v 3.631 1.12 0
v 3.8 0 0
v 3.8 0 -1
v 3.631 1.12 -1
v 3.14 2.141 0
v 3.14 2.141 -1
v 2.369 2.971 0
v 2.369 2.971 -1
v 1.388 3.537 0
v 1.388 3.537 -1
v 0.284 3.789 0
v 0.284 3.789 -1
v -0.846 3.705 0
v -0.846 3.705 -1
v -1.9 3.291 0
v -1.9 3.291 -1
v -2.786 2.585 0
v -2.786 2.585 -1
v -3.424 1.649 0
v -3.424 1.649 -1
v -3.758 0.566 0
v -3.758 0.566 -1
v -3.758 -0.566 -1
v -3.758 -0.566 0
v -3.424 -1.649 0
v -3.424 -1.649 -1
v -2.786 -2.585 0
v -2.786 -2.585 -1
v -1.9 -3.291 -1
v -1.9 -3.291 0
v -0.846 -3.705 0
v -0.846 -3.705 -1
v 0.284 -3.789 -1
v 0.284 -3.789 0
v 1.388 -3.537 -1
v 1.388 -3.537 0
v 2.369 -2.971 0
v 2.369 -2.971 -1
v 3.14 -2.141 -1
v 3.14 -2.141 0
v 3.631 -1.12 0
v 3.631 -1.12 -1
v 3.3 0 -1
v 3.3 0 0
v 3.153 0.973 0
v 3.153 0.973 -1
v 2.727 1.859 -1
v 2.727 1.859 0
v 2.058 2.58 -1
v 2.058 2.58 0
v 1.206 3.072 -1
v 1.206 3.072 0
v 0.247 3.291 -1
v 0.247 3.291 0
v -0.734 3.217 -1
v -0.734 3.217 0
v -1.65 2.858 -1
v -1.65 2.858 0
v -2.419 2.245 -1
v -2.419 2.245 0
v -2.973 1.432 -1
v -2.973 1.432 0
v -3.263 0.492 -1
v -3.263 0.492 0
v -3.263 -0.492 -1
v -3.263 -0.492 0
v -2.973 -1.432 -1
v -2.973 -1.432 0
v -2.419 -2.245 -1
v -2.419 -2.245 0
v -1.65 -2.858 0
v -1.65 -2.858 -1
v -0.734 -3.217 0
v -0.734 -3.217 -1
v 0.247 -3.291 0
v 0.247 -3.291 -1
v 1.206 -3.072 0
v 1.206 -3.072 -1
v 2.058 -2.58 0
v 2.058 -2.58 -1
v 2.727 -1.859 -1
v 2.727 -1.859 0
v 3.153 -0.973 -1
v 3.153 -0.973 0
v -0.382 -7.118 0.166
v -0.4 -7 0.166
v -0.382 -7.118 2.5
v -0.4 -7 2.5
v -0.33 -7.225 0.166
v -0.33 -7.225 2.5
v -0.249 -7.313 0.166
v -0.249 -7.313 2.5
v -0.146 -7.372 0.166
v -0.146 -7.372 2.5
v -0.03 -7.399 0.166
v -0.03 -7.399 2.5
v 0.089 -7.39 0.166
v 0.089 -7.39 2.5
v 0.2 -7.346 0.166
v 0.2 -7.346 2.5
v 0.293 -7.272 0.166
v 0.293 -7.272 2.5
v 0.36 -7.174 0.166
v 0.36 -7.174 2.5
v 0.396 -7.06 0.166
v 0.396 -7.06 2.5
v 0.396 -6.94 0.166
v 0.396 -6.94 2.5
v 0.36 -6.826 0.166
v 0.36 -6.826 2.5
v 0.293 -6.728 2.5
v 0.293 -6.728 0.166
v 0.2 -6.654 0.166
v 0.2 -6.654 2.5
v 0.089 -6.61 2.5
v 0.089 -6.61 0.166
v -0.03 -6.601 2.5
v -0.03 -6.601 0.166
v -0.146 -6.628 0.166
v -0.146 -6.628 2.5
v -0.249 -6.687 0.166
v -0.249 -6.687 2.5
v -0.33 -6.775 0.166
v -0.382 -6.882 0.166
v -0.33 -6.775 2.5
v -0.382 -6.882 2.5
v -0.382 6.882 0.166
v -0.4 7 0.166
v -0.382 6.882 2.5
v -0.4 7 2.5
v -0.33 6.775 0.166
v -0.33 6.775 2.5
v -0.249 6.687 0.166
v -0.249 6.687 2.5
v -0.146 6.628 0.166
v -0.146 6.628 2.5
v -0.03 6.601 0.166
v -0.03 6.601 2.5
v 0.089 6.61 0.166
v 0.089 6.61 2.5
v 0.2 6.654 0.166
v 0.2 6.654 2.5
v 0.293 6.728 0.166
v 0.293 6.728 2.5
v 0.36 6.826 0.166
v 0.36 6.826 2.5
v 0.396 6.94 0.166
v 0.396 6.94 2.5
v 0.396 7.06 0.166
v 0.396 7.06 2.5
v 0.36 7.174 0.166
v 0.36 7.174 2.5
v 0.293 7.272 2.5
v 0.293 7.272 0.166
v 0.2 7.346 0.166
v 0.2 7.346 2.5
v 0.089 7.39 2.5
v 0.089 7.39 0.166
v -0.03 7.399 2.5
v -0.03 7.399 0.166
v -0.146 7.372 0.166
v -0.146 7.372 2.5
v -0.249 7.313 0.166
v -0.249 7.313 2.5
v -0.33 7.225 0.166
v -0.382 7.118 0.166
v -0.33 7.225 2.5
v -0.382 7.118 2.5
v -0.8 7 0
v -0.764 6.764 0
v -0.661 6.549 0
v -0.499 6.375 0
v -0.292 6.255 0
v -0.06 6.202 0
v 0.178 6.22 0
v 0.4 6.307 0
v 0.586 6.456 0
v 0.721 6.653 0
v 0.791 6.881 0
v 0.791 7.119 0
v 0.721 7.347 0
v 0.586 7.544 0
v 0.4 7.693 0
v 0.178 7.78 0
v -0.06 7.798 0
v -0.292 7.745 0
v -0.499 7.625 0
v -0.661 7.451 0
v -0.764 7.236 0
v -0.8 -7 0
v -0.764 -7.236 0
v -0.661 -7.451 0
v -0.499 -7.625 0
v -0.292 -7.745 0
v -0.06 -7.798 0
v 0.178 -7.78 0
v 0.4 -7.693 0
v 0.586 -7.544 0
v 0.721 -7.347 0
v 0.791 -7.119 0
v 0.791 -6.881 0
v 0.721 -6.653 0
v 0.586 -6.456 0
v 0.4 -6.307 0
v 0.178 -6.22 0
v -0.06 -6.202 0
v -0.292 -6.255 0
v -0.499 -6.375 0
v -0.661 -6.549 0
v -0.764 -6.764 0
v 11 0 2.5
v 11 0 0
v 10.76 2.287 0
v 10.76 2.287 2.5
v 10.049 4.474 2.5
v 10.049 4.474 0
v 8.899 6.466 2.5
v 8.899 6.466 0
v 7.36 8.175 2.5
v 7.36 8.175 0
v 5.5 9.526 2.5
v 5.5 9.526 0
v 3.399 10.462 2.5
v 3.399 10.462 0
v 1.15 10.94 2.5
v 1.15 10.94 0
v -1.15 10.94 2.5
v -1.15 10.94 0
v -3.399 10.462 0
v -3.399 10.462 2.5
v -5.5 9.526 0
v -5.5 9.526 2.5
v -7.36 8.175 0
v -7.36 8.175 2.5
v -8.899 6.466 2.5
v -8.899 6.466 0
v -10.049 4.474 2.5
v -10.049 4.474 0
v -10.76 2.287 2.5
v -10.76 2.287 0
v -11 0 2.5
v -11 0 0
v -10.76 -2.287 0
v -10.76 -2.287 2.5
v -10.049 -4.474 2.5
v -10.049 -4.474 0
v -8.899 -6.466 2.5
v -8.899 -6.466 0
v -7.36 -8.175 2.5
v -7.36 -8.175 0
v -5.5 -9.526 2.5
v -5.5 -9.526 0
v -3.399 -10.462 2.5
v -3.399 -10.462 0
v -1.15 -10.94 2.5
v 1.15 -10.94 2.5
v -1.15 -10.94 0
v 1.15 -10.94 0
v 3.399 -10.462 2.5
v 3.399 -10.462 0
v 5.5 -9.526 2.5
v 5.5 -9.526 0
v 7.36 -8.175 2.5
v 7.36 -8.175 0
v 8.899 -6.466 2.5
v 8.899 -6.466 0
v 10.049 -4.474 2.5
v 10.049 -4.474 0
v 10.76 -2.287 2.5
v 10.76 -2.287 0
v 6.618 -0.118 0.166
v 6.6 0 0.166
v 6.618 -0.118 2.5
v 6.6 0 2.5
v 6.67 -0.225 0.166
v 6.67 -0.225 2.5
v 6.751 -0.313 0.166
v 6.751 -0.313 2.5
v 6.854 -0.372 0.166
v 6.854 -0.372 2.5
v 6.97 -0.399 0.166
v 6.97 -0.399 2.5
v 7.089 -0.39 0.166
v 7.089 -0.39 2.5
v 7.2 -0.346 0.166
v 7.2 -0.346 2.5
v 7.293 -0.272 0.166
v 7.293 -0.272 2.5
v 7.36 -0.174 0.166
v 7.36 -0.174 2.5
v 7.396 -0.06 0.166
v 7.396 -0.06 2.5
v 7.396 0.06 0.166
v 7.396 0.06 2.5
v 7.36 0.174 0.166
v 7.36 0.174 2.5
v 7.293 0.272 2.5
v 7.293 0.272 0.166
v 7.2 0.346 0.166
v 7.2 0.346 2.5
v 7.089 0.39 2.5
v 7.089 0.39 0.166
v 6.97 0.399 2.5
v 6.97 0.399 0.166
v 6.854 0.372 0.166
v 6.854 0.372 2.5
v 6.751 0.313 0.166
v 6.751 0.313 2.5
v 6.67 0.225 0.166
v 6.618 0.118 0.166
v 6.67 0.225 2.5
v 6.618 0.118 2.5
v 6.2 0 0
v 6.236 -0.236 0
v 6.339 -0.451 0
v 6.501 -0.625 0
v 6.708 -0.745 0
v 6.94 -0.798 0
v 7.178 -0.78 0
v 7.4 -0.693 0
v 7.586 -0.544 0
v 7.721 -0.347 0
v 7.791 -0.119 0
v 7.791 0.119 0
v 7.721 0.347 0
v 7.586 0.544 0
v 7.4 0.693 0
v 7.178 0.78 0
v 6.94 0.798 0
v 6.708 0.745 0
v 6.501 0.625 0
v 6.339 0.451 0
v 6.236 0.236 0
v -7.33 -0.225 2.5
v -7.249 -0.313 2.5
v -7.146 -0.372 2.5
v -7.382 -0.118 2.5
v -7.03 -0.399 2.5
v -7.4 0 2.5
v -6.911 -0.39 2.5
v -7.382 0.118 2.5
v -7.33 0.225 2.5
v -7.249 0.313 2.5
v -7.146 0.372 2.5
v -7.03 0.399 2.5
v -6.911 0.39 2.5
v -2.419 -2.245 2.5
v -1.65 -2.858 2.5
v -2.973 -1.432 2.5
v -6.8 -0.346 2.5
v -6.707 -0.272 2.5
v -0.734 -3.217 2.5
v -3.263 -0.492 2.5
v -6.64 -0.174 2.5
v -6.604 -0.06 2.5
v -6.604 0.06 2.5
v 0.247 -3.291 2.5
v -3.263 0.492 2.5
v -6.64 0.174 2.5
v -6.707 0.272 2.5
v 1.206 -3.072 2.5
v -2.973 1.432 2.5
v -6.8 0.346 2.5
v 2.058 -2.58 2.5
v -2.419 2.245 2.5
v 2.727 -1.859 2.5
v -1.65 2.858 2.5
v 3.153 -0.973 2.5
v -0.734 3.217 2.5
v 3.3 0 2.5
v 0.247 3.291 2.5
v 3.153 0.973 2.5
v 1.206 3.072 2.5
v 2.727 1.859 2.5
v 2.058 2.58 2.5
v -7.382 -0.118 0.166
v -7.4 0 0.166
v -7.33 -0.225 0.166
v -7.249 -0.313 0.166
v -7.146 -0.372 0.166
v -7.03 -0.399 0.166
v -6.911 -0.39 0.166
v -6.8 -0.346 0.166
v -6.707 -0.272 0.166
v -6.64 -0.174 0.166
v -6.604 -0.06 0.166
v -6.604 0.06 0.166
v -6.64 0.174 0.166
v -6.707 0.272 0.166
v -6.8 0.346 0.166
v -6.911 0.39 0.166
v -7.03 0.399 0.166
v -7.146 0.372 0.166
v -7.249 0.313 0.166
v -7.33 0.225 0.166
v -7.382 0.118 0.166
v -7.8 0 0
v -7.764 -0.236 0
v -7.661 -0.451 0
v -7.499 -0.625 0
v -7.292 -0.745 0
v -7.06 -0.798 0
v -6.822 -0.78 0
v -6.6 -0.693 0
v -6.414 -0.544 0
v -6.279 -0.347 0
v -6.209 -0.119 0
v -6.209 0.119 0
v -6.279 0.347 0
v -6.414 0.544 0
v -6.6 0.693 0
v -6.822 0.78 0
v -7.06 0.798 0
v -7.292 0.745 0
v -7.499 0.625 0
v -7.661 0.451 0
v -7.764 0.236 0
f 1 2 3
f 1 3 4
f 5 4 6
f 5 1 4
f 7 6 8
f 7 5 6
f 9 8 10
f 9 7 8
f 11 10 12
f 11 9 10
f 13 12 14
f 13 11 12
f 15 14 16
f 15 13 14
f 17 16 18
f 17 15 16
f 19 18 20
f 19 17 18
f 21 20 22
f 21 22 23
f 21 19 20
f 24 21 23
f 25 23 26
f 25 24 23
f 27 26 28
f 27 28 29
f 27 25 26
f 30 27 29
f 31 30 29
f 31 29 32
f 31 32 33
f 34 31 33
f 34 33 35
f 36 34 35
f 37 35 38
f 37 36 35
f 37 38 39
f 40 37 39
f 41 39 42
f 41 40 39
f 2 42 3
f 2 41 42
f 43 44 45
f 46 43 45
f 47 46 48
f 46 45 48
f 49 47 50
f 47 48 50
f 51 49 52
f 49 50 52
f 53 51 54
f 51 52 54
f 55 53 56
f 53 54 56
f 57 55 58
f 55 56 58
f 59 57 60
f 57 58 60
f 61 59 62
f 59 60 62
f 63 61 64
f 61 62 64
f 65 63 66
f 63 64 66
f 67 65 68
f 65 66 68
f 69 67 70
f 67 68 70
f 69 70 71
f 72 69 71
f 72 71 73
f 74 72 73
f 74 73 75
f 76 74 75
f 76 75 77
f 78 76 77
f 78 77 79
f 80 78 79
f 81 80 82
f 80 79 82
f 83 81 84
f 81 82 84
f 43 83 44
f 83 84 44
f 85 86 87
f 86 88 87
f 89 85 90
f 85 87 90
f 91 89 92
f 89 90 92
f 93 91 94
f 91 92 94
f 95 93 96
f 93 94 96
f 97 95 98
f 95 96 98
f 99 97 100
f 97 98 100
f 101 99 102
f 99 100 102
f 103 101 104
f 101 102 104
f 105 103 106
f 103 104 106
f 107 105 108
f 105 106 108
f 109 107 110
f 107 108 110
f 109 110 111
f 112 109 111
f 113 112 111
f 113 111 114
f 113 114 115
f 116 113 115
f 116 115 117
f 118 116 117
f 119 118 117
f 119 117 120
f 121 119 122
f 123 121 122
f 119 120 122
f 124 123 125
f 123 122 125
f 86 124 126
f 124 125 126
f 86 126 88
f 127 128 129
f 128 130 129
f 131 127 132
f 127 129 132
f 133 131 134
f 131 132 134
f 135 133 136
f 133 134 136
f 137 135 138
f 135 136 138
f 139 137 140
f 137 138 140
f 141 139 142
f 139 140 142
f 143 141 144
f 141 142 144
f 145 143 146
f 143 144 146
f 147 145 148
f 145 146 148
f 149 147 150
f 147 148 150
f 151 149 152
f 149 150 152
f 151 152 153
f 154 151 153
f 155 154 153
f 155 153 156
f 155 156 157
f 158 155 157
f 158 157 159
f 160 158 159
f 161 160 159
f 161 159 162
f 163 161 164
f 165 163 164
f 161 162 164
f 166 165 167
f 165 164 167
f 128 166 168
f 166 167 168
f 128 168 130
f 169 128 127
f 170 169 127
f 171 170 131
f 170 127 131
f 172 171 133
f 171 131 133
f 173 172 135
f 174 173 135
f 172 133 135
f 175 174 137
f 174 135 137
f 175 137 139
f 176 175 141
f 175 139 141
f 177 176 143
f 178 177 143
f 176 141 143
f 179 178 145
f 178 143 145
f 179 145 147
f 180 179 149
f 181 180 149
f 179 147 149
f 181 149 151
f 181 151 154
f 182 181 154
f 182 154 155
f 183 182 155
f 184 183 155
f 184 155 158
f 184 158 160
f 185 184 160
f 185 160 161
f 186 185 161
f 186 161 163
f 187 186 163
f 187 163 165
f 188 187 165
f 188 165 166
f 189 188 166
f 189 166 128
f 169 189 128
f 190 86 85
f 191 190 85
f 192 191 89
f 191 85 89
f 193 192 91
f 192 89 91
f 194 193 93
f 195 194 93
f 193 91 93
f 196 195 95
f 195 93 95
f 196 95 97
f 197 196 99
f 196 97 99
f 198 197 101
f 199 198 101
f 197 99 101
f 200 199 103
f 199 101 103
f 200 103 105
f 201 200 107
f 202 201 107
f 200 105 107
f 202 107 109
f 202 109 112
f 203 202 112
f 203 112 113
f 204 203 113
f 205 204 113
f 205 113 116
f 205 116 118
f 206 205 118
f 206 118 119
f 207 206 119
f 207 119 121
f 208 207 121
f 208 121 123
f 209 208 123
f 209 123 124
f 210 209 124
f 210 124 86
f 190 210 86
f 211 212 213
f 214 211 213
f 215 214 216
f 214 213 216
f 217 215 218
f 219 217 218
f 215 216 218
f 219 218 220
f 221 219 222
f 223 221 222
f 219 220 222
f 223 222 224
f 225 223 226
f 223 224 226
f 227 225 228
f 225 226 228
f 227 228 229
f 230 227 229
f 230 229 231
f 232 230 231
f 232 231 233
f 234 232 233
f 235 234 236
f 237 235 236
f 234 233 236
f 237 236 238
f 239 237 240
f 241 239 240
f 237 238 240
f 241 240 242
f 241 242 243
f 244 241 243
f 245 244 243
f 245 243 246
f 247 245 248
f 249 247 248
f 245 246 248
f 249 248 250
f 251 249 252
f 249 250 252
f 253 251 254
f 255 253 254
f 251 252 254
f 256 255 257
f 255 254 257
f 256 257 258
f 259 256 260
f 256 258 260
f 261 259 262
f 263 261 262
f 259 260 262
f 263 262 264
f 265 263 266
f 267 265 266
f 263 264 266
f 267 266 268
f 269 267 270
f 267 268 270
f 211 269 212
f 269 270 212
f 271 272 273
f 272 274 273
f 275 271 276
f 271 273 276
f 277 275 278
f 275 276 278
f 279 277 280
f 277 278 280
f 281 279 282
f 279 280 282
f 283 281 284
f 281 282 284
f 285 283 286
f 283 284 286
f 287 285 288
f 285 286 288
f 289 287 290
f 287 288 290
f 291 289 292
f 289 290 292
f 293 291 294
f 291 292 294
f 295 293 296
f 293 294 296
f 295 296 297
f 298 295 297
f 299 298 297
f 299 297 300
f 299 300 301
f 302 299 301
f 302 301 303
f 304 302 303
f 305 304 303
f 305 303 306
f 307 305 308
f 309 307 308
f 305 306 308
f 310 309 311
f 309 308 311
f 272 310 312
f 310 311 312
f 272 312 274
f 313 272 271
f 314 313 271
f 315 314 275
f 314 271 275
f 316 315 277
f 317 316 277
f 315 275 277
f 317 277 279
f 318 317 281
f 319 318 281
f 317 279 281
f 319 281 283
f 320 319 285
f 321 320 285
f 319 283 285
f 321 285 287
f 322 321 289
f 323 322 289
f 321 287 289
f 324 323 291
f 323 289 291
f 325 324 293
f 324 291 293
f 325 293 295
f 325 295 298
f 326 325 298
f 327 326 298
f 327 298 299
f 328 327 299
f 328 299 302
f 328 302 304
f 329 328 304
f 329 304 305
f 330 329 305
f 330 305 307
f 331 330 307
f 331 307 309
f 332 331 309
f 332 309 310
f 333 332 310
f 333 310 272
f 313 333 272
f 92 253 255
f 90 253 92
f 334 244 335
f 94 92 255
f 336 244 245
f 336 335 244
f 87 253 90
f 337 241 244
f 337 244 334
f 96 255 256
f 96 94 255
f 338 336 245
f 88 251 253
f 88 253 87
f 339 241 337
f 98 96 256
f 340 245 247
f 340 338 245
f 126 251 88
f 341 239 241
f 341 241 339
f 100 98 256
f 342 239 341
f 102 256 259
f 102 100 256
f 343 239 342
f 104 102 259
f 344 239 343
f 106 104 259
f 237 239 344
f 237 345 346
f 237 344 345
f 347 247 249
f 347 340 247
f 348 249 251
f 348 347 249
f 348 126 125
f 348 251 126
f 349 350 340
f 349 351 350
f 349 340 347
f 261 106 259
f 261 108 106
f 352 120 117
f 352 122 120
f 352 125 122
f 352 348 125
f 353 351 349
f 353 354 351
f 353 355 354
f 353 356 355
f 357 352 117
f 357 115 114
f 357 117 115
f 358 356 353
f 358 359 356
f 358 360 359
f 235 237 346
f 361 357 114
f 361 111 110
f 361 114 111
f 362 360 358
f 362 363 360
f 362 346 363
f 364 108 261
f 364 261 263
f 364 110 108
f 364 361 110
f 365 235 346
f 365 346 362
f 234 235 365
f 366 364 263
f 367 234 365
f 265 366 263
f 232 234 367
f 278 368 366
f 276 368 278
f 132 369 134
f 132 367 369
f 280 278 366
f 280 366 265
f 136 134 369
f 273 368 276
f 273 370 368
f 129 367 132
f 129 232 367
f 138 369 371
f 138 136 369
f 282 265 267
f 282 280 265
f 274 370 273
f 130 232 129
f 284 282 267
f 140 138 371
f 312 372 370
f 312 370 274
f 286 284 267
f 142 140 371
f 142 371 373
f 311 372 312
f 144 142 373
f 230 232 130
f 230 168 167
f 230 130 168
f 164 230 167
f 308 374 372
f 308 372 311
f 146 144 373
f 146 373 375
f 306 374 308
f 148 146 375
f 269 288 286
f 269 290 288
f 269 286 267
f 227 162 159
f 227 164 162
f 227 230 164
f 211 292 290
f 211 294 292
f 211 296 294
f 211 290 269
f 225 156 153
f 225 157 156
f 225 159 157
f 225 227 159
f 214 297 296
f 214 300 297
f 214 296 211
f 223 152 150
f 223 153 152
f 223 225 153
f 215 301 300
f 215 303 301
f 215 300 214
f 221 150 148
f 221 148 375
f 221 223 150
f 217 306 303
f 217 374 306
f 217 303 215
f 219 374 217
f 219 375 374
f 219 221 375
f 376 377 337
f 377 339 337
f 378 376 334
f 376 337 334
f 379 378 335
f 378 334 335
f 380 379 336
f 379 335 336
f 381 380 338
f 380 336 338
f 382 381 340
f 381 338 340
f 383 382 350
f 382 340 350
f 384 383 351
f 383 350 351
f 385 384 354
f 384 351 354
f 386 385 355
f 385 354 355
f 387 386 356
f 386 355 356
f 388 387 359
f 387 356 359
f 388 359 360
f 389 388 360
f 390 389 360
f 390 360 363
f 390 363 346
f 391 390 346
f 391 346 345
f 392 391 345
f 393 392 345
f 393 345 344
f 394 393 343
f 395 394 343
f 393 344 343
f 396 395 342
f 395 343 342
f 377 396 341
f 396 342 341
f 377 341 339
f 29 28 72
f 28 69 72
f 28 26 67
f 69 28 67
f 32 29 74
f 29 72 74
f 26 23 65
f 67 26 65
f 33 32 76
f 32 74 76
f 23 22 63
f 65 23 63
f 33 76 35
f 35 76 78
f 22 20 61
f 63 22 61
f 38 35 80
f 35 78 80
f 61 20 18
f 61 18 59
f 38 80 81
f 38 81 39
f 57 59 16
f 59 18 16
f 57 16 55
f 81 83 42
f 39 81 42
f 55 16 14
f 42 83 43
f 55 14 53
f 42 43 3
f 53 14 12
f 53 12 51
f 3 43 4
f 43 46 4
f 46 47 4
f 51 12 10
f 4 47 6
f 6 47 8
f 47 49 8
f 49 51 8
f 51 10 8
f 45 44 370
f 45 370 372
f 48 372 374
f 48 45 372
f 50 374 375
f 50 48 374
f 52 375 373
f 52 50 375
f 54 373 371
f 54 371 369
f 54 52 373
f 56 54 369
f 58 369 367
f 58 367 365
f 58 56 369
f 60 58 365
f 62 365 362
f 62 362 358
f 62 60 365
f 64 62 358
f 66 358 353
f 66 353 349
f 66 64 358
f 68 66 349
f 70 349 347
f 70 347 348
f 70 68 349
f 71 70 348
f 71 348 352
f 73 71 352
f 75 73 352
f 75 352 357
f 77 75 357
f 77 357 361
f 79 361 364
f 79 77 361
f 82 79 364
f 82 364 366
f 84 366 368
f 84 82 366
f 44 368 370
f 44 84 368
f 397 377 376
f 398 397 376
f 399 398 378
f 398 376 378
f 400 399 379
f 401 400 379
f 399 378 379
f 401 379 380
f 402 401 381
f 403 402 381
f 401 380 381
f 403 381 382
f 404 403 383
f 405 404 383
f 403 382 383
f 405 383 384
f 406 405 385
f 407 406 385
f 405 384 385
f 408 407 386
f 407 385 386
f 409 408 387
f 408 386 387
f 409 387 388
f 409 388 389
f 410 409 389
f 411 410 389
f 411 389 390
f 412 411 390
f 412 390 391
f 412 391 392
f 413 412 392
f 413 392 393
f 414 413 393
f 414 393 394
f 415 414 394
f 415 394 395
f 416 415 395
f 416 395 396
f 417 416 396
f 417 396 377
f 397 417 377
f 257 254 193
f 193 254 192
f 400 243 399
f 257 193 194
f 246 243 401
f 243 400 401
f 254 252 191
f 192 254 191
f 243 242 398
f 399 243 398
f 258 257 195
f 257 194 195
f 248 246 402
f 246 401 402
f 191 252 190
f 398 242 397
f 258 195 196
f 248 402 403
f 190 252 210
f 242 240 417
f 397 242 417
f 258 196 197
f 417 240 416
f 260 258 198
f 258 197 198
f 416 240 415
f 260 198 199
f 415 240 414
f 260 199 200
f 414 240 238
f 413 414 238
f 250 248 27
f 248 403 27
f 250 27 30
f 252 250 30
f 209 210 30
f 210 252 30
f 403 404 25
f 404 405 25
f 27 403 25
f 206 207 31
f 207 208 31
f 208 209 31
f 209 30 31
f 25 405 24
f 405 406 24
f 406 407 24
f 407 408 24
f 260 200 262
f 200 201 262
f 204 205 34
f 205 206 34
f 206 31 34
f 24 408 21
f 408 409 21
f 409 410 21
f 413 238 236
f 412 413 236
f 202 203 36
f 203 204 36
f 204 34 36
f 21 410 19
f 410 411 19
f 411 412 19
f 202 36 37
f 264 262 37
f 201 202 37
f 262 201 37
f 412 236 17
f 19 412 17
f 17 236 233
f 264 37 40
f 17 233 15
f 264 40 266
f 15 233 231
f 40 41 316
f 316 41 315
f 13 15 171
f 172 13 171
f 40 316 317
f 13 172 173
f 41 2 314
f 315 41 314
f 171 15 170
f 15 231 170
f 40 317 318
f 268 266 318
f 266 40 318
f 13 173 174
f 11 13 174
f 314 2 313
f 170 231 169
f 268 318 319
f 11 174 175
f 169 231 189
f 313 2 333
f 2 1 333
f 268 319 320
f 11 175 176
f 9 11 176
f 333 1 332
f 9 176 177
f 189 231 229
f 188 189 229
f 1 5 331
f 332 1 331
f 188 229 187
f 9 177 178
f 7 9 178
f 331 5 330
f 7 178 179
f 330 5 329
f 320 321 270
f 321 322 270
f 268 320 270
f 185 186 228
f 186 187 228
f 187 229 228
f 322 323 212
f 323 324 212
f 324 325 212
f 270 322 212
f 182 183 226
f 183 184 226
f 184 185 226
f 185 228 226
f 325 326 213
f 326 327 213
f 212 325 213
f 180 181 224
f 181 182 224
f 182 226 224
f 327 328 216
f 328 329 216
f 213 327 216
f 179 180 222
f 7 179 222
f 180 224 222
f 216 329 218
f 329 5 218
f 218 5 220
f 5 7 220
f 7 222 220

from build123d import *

# Parameters (mm, degrees)
F0_R           = 11
F0_R_2         = 3.8
F0_R_3         = 3.3
F1_DEPTH       = 2.5
F2_DEPTH       = 1
F3_D           = 0.8
F3_CSINK_D     = 1.6
F3_CSINK_ANGLE = 135


with BuildPart() as f1:
    # F0 (on Top) → F1 (new body)
    with BuildSketch(Plane.XY):
        Circle(F0_R)
        Circle(F0_R_2, mode=Mode.SUBTRACT)
        Circle(F0_R_2)
        Circle(F0_R_3, mode=Mode.SUBTRACT)
    extrude(amount=F1_DEPTH)

    # F0 (on Top) → F2 (join)
    with BuildSketch(Plane.XY):
        Circle(F0_R_2)
        Circle(F0_R_3, mode=Mode.SUBTRACT)
    extrude(amount=-F2_DEPTH)

    # F3 (through all)
    with Locations(Plane(origin=(0, 0, 0), x_dir=(1, 0, 0), z_dir=(0, 0, -1))):
        with Locations((0, 7), (7, 0), (0, -7), (-7, 0)):
            CounterSinkHole(F3_D / 2, F3_CSINK_D / 2, counter_sink_angle=F3_CSINK_ANGLE)


solid = f1.part
